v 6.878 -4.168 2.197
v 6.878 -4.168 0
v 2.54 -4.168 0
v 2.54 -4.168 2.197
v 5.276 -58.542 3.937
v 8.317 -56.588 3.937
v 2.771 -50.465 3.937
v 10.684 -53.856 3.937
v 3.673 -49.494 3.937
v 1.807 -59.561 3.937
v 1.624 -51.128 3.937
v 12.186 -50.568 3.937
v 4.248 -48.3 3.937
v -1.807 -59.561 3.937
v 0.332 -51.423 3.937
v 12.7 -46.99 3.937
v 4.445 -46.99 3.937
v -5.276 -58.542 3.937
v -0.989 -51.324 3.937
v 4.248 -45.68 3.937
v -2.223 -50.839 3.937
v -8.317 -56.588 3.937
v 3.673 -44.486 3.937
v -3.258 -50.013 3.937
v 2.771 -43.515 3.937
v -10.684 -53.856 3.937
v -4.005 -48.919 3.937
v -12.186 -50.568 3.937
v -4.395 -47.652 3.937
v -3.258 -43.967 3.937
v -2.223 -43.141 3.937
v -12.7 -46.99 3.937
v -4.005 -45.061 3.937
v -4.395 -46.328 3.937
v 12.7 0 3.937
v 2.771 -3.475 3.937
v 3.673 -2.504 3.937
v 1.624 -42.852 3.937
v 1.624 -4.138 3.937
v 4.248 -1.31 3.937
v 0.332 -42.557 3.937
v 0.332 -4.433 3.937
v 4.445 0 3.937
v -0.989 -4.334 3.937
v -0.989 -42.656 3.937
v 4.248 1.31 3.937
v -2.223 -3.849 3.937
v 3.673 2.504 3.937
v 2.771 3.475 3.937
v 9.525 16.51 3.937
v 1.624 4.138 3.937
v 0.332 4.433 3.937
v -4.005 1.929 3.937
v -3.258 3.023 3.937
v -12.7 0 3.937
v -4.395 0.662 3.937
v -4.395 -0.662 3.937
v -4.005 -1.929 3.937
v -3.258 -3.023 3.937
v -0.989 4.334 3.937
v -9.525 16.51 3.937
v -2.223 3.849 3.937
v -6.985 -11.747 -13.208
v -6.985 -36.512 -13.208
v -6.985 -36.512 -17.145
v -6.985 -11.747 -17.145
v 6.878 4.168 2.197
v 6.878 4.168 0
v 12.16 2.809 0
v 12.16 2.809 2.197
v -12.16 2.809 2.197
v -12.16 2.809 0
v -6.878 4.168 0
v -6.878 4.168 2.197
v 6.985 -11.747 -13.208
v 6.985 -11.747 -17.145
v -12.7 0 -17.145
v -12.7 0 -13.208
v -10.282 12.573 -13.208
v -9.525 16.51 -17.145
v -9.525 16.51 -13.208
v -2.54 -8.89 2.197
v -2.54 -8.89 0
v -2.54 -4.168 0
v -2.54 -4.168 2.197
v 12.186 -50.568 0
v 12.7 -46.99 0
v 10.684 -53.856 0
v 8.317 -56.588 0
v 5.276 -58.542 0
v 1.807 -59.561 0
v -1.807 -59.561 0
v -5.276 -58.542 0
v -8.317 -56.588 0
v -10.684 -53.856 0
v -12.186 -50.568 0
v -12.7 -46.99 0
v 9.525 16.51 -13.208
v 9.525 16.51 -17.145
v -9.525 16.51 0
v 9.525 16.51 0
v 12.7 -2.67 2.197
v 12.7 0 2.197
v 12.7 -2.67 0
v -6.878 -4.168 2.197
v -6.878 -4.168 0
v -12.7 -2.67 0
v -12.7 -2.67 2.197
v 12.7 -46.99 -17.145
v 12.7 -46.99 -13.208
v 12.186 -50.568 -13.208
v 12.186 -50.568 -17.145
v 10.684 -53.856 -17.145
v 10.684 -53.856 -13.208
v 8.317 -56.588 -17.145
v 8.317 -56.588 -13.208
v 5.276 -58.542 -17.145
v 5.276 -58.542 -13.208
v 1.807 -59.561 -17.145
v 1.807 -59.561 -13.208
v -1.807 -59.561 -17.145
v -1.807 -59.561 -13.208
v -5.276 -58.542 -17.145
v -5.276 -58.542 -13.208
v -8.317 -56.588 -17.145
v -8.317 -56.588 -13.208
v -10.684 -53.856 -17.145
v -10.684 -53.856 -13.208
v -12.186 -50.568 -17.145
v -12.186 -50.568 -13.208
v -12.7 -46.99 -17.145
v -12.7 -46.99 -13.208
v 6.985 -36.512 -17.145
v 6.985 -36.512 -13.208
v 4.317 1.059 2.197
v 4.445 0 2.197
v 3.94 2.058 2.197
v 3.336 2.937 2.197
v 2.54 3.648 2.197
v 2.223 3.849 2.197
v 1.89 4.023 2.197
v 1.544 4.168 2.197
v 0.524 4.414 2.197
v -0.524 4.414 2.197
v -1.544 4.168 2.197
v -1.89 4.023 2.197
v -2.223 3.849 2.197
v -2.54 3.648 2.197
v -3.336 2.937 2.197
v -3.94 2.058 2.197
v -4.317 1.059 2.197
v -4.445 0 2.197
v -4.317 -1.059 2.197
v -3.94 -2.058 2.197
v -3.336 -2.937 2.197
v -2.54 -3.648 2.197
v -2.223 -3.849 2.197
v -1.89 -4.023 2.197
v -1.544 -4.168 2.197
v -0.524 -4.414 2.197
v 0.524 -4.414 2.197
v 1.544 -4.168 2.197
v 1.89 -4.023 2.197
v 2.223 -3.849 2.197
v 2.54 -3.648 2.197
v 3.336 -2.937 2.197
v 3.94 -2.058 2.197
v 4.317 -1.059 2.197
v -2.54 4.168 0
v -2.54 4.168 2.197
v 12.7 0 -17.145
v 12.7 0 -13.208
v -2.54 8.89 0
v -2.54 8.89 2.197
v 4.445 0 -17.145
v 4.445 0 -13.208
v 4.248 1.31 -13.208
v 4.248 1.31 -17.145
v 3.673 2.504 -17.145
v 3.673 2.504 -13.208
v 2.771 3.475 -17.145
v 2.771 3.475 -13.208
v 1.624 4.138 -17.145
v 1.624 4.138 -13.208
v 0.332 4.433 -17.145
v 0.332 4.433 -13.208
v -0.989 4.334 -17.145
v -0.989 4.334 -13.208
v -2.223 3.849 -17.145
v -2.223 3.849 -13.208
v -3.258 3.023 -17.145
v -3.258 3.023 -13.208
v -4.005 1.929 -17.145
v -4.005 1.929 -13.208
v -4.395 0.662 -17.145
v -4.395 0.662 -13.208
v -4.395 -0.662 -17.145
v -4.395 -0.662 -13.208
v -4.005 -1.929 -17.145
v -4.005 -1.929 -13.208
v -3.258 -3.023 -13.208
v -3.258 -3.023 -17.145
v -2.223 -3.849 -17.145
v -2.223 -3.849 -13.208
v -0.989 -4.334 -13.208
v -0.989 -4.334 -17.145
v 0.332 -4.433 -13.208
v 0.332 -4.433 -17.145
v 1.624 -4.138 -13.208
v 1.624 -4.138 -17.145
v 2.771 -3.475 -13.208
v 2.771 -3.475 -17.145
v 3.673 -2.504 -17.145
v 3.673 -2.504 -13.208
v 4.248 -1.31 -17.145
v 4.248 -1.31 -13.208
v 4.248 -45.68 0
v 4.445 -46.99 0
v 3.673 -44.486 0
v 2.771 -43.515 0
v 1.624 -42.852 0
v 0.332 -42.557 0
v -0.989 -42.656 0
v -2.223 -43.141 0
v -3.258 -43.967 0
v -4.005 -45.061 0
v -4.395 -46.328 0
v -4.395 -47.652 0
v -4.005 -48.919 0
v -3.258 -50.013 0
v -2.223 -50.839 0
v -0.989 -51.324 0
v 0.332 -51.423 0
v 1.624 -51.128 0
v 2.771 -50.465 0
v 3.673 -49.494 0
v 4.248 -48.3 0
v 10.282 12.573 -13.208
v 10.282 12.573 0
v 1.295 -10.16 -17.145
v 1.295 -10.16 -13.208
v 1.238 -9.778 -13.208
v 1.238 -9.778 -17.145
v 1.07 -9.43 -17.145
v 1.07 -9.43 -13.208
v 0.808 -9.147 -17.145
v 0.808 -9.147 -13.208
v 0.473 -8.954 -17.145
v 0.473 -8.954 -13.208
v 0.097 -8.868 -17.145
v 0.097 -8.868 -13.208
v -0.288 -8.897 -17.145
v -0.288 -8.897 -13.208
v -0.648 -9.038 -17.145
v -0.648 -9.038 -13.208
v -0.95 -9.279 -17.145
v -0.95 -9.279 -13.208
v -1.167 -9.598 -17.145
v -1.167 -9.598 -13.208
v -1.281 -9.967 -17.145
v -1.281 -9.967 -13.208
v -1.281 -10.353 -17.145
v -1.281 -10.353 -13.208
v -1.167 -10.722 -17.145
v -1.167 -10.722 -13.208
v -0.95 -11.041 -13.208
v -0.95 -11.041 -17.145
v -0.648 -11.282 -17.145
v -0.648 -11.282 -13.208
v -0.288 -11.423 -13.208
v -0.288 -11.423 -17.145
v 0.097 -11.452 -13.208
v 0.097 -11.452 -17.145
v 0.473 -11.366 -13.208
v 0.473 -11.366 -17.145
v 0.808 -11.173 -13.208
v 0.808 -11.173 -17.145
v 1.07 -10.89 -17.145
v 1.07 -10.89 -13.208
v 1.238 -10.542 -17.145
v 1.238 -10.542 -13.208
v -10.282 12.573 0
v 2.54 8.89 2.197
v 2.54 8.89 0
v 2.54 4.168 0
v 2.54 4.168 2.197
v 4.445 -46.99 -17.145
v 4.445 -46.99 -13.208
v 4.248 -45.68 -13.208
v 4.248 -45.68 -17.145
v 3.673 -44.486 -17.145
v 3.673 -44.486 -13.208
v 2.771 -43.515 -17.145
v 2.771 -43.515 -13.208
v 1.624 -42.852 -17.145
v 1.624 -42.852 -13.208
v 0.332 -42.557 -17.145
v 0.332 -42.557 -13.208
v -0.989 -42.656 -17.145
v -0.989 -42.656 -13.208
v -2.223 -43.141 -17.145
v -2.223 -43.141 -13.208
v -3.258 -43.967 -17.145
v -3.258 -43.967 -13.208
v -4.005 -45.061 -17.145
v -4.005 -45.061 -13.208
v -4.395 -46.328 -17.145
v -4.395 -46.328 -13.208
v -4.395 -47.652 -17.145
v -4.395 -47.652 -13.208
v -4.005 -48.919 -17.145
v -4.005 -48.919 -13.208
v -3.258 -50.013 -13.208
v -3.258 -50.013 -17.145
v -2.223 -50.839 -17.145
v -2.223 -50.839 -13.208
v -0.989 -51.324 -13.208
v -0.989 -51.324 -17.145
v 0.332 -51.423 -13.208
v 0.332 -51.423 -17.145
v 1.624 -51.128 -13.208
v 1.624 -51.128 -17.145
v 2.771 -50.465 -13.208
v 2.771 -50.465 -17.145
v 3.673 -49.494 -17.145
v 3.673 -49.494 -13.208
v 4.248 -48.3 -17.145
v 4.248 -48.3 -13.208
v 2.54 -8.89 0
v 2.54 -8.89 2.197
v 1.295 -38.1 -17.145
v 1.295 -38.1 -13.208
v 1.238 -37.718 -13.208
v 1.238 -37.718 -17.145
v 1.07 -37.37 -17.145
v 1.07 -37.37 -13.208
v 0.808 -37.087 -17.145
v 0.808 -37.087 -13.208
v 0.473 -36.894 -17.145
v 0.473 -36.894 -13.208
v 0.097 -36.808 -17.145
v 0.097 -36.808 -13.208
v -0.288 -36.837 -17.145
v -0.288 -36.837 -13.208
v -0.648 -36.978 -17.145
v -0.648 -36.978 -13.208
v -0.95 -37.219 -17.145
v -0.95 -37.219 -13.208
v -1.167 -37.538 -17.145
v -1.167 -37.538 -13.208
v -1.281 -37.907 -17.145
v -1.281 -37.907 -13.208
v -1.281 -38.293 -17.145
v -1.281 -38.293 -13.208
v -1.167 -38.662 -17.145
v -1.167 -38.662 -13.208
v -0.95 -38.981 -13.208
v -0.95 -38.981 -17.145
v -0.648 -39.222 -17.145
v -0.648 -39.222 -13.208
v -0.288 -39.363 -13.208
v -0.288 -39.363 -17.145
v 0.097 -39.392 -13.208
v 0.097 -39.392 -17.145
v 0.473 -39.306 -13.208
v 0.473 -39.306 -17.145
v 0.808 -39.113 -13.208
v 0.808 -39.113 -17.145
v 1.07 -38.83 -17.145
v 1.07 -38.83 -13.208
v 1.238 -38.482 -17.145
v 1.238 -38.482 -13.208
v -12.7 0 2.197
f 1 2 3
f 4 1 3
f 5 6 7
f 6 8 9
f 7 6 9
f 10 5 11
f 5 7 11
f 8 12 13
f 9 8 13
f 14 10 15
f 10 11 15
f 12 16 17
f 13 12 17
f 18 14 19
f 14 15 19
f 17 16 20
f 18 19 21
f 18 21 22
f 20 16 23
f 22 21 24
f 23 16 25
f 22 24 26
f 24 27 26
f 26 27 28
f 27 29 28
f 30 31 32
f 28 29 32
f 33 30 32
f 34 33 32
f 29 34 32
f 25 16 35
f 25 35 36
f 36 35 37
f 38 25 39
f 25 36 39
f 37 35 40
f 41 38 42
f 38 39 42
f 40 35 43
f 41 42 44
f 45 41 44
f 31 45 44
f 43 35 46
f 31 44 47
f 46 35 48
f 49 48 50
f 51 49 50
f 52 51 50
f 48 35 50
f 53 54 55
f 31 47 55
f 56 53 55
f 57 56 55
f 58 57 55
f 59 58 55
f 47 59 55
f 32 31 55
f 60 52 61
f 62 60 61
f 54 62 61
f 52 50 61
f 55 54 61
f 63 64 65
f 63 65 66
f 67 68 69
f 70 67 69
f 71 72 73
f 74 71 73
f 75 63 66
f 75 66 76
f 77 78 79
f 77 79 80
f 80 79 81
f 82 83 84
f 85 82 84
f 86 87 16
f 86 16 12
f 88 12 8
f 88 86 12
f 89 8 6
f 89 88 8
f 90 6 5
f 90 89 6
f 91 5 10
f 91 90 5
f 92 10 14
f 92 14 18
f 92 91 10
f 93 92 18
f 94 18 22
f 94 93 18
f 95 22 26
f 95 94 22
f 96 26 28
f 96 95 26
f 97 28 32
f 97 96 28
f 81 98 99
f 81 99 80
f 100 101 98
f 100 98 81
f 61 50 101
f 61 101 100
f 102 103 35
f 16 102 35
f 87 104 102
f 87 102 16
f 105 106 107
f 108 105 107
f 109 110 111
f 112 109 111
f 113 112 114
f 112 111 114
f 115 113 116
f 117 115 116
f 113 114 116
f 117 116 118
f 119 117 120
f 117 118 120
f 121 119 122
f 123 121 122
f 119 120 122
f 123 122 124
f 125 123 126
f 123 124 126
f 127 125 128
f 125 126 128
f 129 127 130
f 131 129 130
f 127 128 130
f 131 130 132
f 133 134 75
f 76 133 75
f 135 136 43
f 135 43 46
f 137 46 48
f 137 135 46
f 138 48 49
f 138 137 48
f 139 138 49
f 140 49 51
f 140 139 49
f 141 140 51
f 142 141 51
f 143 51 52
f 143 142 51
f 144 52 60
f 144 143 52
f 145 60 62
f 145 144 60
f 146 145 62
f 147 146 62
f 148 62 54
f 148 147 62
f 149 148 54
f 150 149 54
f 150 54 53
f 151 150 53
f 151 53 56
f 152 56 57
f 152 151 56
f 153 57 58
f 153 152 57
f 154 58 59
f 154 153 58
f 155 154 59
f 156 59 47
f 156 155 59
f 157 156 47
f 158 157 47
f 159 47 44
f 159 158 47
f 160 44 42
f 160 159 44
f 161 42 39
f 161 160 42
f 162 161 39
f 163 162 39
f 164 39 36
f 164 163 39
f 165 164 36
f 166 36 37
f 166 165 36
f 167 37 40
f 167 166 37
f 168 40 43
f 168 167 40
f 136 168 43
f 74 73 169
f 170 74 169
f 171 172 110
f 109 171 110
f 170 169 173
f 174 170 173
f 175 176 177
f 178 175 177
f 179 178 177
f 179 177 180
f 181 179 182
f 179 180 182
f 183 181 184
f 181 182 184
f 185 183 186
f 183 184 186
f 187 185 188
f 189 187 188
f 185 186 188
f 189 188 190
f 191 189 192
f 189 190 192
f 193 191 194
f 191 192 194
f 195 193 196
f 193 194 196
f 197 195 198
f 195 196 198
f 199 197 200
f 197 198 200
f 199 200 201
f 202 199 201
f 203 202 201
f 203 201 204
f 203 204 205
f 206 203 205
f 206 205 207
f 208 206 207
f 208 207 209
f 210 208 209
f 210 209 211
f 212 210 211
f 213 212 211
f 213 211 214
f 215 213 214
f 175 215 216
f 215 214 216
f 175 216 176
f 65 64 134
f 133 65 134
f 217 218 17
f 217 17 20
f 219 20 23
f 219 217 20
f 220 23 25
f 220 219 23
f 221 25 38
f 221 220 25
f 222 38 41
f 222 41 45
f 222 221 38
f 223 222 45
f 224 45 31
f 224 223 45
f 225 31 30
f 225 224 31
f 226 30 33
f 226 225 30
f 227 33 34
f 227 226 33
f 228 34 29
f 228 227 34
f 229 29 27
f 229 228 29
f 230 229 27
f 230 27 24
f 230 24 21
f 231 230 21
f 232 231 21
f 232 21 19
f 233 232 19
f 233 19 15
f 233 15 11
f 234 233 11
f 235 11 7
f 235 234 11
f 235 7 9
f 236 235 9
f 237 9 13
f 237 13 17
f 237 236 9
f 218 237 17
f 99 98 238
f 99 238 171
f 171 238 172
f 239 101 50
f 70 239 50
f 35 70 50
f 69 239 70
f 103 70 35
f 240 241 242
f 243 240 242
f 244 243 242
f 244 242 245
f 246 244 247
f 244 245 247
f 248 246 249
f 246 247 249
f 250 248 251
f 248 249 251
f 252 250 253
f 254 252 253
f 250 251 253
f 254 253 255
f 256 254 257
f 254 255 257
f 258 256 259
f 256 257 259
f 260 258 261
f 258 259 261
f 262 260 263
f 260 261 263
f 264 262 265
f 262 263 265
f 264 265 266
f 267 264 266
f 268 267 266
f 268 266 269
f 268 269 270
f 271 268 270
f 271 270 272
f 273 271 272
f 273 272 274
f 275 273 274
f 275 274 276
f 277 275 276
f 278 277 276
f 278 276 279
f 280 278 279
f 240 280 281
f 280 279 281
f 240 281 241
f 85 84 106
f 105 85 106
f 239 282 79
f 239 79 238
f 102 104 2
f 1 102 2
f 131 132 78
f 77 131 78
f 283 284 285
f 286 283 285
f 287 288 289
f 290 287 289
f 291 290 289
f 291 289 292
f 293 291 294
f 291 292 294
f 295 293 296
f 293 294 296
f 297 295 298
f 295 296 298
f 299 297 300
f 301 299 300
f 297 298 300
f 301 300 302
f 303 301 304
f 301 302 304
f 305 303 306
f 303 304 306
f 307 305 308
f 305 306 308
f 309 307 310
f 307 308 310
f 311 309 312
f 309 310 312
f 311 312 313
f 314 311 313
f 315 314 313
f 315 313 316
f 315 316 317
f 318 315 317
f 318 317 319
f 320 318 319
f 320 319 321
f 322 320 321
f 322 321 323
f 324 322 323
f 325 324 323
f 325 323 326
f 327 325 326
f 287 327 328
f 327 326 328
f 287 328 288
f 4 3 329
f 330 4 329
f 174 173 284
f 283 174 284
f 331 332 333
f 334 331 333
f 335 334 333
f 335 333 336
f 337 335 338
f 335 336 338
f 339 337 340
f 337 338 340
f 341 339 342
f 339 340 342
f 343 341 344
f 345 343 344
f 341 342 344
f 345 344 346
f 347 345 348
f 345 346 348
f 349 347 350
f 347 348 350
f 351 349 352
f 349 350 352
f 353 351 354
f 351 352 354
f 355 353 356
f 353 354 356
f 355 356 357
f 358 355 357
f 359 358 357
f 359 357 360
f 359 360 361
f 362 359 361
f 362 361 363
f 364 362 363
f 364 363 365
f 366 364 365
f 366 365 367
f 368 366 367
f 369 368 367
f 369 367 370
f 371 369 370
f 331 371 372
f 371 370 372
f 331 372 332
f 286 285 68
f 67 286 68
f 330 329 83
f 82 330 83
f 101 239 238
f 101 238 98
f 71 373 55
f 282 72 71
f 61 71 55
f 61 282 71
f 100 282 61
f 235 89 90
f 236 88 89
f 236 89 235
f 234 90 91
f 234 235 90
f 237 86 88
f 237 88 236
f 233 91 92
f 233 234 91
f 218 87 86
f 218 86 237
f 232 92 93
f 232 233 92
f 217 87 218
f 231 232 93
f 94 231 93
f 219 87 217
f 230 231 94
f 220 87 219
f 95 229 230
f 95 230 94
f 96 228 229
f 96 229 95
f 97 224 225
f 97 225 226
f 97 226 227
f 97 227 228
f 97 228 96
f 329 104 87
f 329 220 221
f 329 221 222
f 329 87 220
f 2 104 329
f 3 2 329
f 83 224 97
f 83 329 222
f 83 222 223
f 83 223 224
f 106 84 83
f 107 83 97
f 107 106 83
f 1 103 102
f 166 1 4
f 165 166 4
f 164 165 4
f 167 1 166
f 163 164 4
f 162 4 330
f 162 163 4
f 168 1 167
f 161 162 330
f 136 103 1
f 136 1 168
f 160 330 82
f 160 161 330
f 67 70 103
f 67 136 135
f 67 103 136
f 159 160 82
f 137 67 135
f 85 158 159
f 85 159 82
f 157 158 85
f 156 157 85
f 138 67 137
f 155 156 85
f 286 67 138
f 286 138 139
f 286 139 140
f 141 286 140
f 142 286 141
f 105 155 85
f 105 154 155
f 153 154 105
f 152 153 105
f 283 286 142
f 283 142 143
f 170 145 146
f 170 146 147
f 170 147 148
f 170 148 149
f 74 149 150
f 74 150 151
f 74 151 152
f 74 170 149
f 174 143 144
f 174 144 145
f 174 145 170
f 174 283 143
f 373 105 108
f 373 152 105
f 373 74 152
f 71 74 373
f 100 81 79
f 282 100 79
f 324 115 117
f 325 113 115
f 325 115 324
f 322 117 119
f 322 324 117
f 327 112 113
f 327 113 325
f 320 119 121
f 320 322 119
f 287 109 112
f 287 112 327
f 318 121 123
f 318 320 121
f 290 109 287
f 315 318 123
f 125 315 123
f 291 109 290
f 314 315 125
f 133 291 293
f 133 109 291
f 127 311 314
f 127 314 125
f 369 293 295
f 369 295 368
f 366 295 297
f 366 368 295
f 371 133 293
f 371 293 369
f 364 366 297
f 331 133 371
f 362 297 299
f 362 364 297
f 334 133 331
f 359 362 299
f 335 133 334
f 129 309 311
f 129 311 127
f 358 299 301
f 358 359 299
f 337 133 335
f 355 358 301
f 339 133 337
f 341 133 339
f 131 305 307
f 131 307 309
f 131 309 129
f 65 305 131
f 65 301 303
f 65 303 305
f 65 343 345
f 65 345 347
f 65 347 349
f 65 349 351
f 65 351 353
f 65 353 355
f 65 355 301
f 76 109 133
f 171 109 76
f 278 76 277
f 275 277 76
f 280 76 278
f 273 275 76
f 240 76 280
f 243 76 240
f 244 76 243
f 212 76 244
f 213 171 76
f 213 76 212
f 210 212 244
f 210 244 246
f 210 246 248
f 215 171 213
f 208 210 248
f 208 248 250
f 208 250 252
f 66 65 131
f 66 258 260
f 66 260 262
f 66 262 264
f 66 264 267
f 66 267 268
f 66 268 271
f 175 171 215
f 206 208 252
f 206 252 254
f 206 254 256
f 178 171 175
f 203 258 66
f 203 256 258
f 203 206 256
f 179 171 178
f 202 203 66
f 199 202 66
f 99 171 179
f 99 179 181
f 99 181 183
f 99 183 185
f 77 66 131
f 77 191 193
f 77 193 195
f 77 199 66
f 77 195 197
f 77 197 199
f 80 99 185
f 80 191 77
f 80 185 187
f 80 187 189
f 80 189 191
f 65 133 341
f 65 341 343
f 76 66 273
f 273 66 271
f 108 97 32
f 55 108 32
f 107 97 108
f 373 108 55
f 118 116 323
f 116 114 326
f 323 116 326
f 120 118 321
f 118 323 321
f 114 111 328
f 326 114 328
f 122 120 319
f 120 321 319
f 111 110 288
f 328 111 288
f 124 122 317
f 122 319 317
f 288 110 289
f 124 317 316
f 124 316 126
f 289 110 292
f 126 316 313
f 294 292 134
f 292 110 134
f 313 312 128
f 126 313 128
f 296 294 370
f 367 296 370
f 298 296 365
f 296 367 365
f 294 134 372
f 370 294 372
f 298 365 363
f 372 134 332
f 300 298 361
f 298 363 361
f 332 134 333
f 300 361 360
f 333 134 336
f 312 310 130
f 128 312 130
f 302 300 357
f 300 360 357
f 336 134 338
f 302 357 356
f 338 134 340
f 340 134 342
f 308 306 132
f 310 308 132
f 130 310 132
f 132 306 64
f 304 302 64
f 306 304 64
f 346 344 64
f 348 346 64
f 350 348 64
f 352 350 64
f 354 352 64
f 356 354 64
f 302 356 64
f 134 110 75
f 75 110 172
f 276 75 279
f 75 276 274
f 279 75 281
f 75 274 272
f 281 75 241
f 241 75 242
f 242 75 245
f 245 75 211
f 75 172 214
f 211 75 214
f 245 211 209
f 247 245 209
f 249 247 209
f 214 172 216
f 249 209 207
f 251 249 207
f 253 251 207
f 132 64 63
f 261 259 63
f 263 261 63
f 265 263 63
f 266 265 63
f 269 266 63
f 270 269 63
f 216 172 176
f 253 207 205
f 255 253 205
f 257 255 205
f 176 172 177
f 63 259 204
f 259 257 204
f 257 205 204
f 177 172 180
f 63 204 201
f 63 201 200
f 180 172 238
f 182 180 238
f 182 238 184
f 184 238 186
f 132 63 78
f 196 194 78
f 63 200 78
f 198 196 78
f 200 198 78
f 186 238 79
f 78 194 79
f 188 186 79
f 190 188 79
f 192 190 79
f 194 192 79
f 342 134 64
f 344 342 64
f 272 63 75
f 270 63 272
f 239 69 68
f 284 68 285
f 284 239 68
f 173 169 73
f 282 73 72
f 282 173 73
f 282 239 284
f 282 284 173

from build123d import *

# Parameters (mm, degrees)
SKETCH1_R           = 4.445
BOSS_EXTRUDE1_DEPTH = 3.937
BOSS_EXTRUDE3_START = -13.208
SKETCH1_5_R         = 4.445
SKETCH1_5_R_2       = 1.2954
SKETCH1_5_W         = 13.97
SKETCH1_5_H         = 24.765
BOSS_EXTRUDE3_DEPTH = 3.937
CUT_EXTRUDE4_DEPTH  = 2.1971
BOSS_EXTRUDE5_DEPTH = 16.4211


with BuildPart() as part:
    # Sketch1 (on Front Plane) → Boss-Extrude1 (new body)
    with BuildSketch(Plane.XY):
        with BuildLine():
            Line((-12.7, 0), (-9.525, 16.51))
            Line((-9.525, 16.51), (9.525, 16.51))
            Line((9.525, 16.51), (12.7, 0))
            Line((12.7, 0), (12.7, -46.99))
            ThreePointArc((12.7, -46.99), (0, -59.69), (-12.7, -46.99))
            Line((-12.7, -46.99), (-12.7, 0))
        make_face()
        Circle(SKETCH1_R, mode=Mode.SUBTRACT)
        with Locations((0, -46.99)):
            Circle(SKETCH1_R, mode=Mode.SUBTRACT)
    extrude(amount=BOSS_EXTRUDE1_DEPTH)

    # Sketch4 → Cut-Extrude4 (cut)
    with BuildSketch(Plane(origin=(0, 0, 0), x_dir=(-1, 0, 0), z_dir=(0, 0, -1))):
        with BuildLine():
            Line((-12.7, 0), (-12.7, -2.669886907))
            Line((-12.7, -2.669886907), (-6.878326735, -4.168384986))
            Line((-6.878326735, -4.168384986), (-2.54, -4.168384986))
            Line((-2.54, -4.168384986), (-2.54, -3.647797281))
            ThreePointArc((-2.54, -3.647797281), (-4.445, 0), (-2.54, 3.647797281))
            Line((-2.54, 3.647797281), (-2.54, 4.168384986))
            Line((-2.54, 4.168384986), (-6.878326735, 4.168384986))
            Line((-6.878326735, 4.168384986), (-12.15982138, 2.808928827))
            Line((-12.15982138, 2.808928827), (-12.7, 0))
        make_face()
        with BuildLine():
            Line((-1.543564577, -4.168384986), (-2.54, -4.168384986))
            Line((-2.54, -4.168384986), (-2.54, -8.89))
            Line((-2.54, -8.89), (2.54, -8.89))
            Line((2.54, -8.89), (2.54, -4.168384986))
            Line((2.54, -4.168384986), (1.543564577, -4.168384986))
            ThreePointArc((1.543564577, -4.168384986), (0, -4.445), (-1.543564577, -4.168384986))
        make_face()
        with BuildLine():
            Line((2.54, -3.647797281), (2.54, -4.168384986))
            Line((2.54, -4.168384986), (6.878326735, -4.168384986))
            Line((6.878326735, -4.168384986), (12.7, -2.669886907))
            Line((12.7, -2.669886907), (12.7, 0))
            Line((12.7, 0), (12.15982138, 2.808928827))
            Line((12.15982138, 2.808928827), (6.878326735, 4.168384986))
            Line((6.878326735, 4.168384986), (2.54, 4.168384986))
            Line((2.54, 4.168384986), (2.54, 3.647797281))
            ThreePointArc((2.54, 3.647797281), (3.940071383, 2.057635172), (4.445, 0))
            ThreePointArc((4.445, 0), (3.940071383, -2.057635172), (2.54, -3.647797281))
        make_face()
        with BuildLine():
            Line((-2.54, 8.89), (-2.54, 4.168384986))
            Line((-2.54, 4.168384986), (-1.543564577, 4.168384986))
            ThreePointArc((-1.543564577, 4.168384986), (0, 4.445), (1.543564577, 4.168384986))
            Line((1.543564577, 4.168384986), (2.54, 4.168384986))
            Line((2.54, 4.168384986), (2.54, 8.89))
            Line((2.54, 8.89), (-2.54, 8.89))
        make_face()
        with BuildLine():
            Line((2.54, 4.168384986), (1.543564577, 4.168384986))
            ThreePointArc((1.543564577, 4.168384986), (2.058307024, 3.939720446), (2.54, 3.647797281))
            Line((2.54, 3.647797281), (2.54, 4.168384986))
        make_face()
        with BuildLine():
            Line((-1.543564577, 4.168384986), (-2.54, 4.168384986))
            Line((-2.54, 4.168384986), (-2.54, 3.647797281))
            ThreePointArc((-2.54, 3.647797281), (-2.058307024, 3.939720446), (-1.543564577, 4.168384986))
        make_face()
        with BuildLine():
            ThreePointArc((2.54, -3.647797281), (2.058307024, -3.939720446), (1.543564577, -4.168384986))
            Line((1.543564577, -4.168384986), (2.54, -4.168384986))
            Line((2.54, -4.168384986), (2.54, -3.647797281))
        make_face()
        with BuildLine():
            Line((-2.54, -3.647797281), (-2.54, -4.168384986))
            Line((-2.54, -4.168384986), (-1.543564577, -4.168384986))
            ThreePointArc((-1.543564577, -4.168384986), (-2.058307024, -3.939720446), (-2.54, -3.647797281))
        make_face()
    extrude(amount=-CUT_EXTRUDE4_DEPTH, mode=Mode.SUBTRACT)



with BuildPart() as body_2:
    # Sketch1<5> → Boss-Extrude3 (new body)
    with BuildSketch(Plane.XY.offset(BOSS_EXTRUDE3_START)):
        with BuildLine():
            Line((-12.7, 0), (-9.525, 16.51))
            Line((-9.525, 16.51), (9.525, 16.51))
            Line((9.525, 16.51), (12.7, 0))
            Line((12.7, 0), (12.7, -46.99))
            ThreePointArc((12.7, -46.99), (0, -59.69), (-12.7, -46.99))
            Line((-12.7, -46.99), (-12.7, 0))
        make_face()
        Circle(SKETCH1_5_R, mode=Mode.SUBTRACT)
        with Locations((0, -10.16)):
            Circle(SKETCH1_5_R_2, mode=Mode.SUBTRACT)
        with Locations((0, -38.1)):
            Circle(SKETCH1_5_R_2, mode=Mode.SUBTRACT)
        with Locations((0, -46.99)):
            Circle(SKETCH1_5_R, mode=Mode.SUBTRACT)
        with Locations((0, -24.13)):
            Rectangle(SKETCH1_5_W, SKETCH1_5_H, mode=Mode.SUBTRACT)
    extrude(amount=-BOSS_EXTRUDE3_DEPTH)


with BuildPart() as part_1:
    add(part.part)

    add(body_2.part)  # Boss-Extrude5 merges body 2
    # Sketch5 → Boss-Extrude5 (add)
    with BuildSketch(Plane(origin=(0, 0, 0), x_dir=(-1, 0, 0), z_dir=(0, 0, -1))):
        Polygon((-9.525, 16.51), (9.525, 16.51), (10.282115385, 12.573), (-10.282115385, 12.573), align=None)
    extrude(amount=BOSS_EXTRUDE5_DEPTH)


solid = part_1.part
